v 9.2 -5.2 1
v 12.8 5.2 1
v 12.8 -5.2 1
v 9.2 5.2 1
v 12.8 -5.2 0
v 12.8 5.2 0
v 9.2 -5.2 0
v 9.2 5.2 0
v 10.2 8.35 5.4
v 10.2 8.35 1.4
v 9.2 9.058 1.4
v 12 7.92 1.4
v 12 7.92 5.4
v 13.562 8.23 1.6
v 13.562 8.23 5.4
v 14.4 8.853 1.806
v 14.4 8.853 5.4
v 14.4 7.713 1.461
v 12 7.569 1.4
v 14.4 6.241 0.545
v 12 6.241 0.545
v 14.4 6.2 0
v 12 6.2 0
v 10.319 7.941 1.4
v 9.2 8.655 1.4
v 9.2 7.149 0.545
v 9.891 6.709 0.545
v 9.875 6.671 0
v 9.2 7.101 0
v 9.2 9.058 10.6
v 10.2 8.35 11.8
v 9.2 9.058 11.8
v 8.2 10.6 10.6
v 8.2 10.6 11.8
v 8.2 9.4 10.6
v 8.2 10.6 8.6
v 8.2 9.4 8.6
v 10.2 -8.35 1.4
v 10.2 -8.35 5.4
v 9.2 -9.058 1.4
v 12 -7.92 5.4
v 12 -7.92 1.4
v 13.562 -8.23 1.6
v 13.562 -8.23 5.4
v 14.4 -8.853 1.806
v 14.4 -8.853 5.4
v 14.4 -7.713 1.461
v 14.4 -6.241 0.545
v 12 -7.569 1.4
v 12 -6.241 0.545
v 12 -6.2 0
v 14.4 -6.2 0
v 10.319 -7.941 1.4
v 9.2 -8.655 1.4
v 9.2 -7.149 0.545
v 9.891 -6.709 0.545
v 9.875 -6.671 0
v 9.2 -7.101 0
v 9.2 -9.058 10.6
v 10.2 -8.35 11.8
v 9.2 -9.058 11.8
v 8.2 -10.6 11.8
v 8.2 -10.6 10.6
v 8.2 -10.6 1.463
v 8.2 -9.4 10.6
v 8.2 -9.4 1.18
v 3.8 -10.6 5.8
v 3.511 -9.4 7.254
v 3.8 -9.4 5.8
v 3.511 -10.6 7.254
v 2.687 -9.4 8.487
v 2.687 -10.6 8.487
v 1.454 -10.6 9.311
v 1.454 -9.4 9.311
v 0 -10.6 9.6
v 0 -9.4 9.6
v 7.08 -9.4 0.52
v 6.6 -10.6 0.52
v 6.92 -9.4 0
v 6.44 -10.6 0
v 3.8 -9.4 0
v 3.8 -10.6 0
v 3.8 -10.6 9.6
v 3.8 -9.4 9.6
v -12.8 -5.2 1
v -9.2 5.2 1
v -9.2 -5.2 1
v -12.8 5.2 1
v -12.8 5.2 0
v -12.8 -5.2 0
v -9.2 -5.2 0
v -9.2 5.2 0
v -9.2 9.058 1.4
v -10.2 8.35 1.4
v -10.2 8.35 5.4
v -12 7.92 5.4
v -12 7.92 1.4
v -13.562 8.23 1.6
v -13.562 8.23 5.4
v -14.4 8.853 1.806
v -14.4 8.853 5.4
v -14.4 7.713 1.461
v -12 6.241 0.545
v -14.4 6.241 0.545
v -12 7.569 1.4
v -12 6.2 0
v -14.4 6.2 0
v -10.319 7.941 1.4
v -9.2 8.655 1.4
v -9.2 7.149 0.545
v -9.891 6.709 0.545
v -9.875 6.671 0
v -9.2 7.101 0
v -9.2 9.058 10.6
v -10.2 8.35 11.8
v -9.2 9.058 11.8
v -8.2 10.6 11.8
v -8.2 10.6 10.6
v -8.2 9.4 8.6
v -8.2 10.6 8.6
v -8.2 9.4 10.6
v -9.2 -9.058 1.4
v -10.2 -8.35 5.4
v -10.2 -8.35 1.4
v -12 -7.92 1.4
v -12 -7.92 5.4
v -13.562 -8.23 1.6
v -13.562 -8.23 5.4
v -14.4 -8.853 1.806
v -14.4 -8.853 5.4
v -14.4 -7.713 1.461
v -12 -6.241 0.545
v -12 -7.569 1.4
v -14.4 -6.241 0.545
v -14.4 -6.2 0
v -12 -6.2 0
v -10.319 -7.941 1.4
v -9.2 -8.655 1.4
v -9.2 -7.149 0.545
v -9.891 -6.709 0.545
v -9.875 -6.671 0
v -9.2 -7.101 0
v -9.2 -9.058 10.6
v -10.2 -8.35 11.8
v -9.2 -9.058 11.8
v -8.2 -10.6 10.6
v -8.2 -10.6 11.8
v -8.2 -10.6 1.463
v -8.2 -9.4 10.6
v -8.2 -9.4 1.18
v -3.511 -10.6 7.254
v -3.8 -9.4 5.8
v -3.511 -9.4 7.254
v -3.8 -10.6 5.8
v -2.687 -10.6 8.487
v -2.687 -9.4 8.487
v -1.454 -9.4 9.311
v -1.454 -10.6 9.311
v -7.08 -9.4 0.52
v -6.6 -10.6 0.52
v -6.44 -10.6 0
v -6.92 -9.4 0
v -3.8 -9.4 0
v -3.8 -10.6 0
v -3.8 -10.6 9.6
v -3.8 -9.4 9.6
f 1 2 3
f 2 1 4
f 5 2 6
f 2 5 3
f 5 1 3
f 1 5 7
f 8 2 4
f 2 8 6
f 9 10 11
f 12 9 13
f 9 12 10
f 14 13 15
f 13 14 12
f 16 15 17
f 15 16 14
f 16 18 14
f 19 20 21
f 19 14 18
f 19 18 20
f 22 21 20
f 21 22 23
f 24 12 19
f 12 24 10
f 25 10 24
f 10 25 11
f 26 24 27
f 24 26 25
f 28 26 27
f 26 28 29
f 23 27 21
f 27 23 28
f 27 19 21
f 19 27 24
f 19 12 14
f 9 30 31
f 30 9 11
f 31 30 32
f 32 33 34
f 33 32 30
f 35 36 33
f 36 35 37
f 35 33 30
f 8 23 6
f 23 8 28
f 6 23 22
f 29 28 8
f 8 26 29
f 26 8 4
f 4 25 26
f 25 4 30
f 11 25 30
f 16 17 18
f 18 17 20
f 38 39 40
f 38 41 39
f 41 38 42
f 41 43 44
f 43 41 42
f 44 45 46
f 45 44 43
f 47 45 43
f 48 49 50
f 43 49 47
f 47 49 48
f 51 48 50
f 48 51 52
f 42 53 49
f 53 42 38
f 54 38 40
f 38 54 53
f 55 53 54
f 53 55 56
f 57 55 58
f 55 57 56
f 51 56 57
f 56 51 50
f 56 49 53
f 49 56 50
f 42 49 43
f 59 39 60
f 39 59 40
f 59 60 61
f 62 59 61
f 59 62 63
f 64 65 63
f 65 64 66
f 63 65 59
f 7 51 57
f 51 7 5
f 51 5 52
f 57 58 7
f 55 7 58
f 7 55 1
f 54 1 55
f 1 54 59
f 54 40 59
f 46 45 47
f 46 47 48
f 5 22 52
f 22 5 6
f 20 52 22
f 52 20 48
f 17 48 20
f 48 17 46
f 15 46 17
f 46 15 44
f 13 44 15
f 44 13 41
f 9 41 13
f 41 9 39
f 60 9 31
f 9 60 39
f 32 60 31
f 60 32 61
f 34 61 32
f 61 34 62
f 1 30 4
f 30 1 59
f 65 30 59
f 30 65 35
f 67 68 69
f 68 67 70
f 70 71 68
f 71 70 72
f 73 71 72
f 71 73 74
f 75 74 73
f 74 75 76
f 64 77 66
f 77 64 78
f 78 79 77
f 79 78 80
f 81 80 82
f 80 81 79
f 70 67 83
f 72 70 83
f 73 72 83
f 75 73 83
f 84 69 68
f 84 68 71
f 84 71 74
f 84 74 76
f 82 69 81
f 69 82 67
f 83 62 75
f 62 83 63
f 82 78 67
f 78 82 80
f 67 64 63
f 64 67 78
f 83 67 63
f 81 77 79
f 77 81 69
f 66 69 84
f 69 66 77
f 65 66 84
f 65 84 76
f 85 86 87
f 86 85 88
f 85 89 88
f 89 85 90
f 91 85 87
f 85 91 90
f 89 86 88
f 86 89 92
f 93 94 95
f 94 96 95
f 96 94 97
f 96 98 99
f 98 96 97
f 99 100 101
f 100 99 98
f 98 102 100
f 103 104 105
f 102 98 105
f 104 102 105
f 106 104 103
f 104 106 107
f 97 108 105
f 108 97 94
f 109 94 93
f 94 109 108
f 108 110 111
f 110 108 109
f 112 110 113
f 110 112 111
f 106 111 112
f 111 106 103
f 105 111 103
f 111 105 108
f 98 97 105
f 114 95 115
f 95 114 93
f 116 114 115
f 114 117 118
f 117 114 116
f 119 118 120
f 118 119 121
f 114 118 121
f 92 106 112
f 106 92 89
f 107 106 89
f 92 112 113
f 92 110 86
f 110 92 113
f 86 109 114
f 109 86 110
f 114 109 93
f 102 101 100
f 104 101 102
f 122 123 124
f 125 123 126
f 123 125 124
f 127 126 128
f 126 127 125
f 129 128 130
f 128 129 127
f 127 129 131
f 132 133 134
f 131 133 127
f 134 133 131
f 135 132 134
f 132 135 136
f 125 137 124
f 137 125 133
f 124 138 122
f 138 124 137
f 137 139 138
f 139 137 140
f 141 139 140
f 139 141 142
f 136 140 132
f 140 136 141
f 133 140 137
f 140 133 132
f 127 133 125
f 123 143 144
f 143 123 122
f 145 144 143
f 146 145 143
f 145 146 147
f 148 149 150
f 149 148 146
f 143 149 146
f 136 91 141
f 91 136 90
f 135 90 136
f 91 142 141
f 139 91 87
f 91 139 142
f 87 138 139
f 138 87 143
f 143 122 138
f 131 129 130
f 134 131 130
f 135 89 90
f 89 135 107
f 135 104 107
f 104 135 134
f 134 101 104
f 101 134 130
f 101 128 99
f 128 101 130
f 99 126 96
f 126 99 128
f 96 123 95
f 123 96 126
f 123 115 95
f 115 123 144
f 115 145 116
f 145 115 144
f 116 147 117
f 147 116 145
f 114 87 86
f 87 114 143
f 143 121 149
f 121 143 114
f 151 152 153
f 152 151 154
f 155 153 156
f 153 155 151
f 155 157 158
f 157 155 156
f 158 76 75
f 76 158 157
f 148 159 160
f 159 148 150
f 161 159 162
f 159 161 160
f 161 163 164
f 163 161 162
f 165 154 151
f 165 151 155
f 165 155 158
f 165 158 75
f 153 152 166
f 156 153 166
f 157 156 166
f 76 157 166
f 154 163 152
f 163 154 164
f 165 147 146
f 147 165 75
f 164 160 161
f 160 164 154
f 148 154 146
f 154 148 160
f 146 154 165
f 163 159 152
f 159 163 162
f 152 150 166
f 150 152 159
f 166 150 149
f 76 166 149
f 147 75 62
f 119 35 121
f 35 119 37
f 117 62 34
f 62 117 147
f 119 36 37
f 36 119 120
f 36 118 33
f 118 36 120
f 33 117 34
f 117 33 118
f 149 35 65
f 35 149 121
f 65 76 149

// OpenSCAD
// file: ../p/1-4edge.scad
use <../lib.scad>
function ldraw_lib__1_4edge() = [
// 0 Circle 0.25
// 0 Name: 1-4edge.dat
// 0 Author: James Jessiman
// 0 !LDRAW_ORG Primitive UPDATE 2017-01
// 0 !LICENSE Licensed under CC BY 4.0 : see CAreadme.txt
// 
// 0 BFC CERTIFY CCW
  [0,"BFC","CERTIFY"],
  [0,"BFC","CCW"],
// 
// 0 !HISTORY 2007-06-22 [PTadmin] Header formatted for Contributor Agreement
// 0 !HISTORY 2008-07-01 [PTadmin] Official Update 2008-01
// 0 !HISTORY 2017-01-15 [Steffen] BFCed
// 0 !HISTORY 2017-12-30 [PTadmin] Official Update 2017-01
// 
// 
// 2 24 1 0 0 0.9239 0 0.3827
  [2,24,1,0,0,0.9239,0,0.3827],
// 2 24 0.9239 0 0.3827 0.7071 0 0.7071
  [2,24,0.9239,0,0.3827,0.7071,0,0.7071],
// 2 24 0.7071 0 0.7071 0.3827 0 0.9239
  [2,24,0.7071,0,0.7071,0.3827,0,0.9239],
// 2 24 0.3827 0 0.9239 0 0 1
  [2,24,0.3827,0,0.9239,0,0,1],
];
module ldraw_lib__1_4edge(step=0, col=false, unit=2/5, alt=false, line=0.2, solid=!$preview)
    makepoly(ldraw_lib__1_4edge(), step=step, col=col, unit=unit, alt=alt, line=line, solid=solid);
ldraw_lib__1_4edge(line=0.2);
// file: ../p/1-4cyli.scad
use <../lib.scad>
function ldraw_lib__1_4cyli() = [
// 0 Cylinder 0.25
// 0 Name: 1-4cyli.dat
// 0 Author: James Jessiman
// 0 !LDRAW_ORG Primitive UPDATE 2012-01
// 0 !LICENSE Licensed under CC BY 4.0 : see CAreadme.txt
// 
// 0 BFC CERTIFY CCW
  [0,"BFC","CERTIFY"],
  [0,"BFC","CCW"],
// 
// 0 !HISTORY 2002-03-23 [sbliss] Added BFC statement.
// 0 !HISTORY 2002-04-25 [PTadmin] Official Update 2002-02
// 0 !HISTORY 2007-06-22 [PTadmin] Header formatted for Contributor Agreement
// 0 !HISTORY 2008-07-01 [PTadmin] Official Update 2008-01
// 0 !HISTORY 2012-02-16 [Philo] Changed to CCW
// 0 !HISTORY 2012-03-30 [PTadmin] Official Update 2012-01
// 
// 
// 4 16 1 1 0 0.9239 1 0.3827 0.9239 0 0.3827 1 0 0
  [4,16,1,1,0,0.9239,1,0.3827,0.9239,0,0.3827,1,0,0],
// 5 24 1 0 0 1 1 0 0.9239 0 0.3827 1 0 -1
  [5,24,1,0,0,1,1,0,0.9239,0,0.3827,1,0,-1],
// 4 16 0.9239 1 0.3827 0.7071 1 0.7071 0.7071 0 0.7071 0.9239 0 0.3827
  [4,16,0.9239,1,0.3827,0.7071,1,0.7071,0.7071,0,0.7071,0.9239,0,0.3827],
// 5 24 0.9239 0 0.3827 0.9239 1 0.3827 0.7071 0 0.7071 1 0 0
  [5,24,0.9239,0,0.3827,0.9239,1,0.3827,0.7071,0,0.7071,1,0,0],
// 4 16 0.7071 1 0.7071 0.3827 1 0.9239 0.3827 0 0.9239 0.7071 0 0.7071
  [4,16,0.7071,1,0.7071,0.3827,1,0.9239,0.3827,0,0.9239,0.7071,0,0.7071],
// 5 24 0.7071 0 0.7071 0.7071 1 0.7071 0.3827 0 0.9239 0.9239 0 0.3827
  [5,24,0.7071,0,0.7071,0.7071,1,0.7071,0.3827,0,0.9239,0.9239,0,0.3827],
// 4 16 0.3827 1 0.9239 0 1 1 0 0 1 0.3827 0 0.9239
  [4,16,0.3827,1,0.9239,0,1,1,0,0,1,0.3827,0,0.9239],
// 5 24 0.3827 0 0.9239 0.3827 1 0.9239 0 0 1 0.7071 0 0.7071
  [5,24,0.3827,0,0.9239,0.3827,1,0.9239,0,0,1,0.7071,0,0.7071],
// 5 24 0 0 1 0 1 1 0.3827 0 0.9239 -1 0 1
  [5,24,0,0,1,0,1,1,0.3827,0,0.9239,-1,0,1],
];
module ldraw_lib__1_4cyli(step=0, col=false, unit=2/5, alt=false, line=0.2, solid=!$preview)
    makepoly(ldraw_lib__1_4cyli(), step=step, col=col, unit=unit, alt=alt, line=line, solid=solid);
ldraw_lib__1_4cyli(line=0.2);
// file: ../p/rect3.scad
use <../lib.scad>
function ldraw_lib__rect3() = [
// 0 Rectangle with 3 Edges
// 0 Name: rect3.dat
// 0 Author: Mark Kennedy [mkennedy]
// 0 !LDRAW_ORG Primitive UPDATE 2010-01
// 0 !LICENSE Licensed under CC BY 4.0 : see CAreadme.txt
// 
// 0 BFC CERTIFY CCW
  [0,"BFC","CERTIFY"],
  [0,"BFC","CCW"],
// 
// 0 !HISTORY 2003-08-01 [PTadmin] Official Update 2003-02
// 0 !HISTORY 2007-06-24 [PTadmin] Header formatted for Contributor Agreement
// 0 !HISTORY 2008-07-01 [PTadmin] Official Update 2008-01
// 0 !HISTORY 2010-01-17 [mikeheide] Change winding to CCW
// 0 !HISTORY 2010-04-05 [PTadmin] Official Update 2010-01
// 
// 
// 2 24 1 0 1 -1 0 1
  [2,24,1,0,1,-1,0,1],
// 2 24 1 0 1 1 0 -1
  [2,24,1,0,1,1,0,-1],
// 2 24 -1 0 1 -1 0 -1
  [2,24,-1,0,1,-1,0,-1],
// 4 16 -1 0 1 -1 0 -1 1 0 -1 1 0 1
  [4,16,-1,0,1,-1,0,-1,1,0,-1,1,0,1],
// 0 //
];
module ldraw_lib__rect3(step=0, col=false, unit=2/5, alt=false, line=0.2, solid=!$preview)
    makepoly(ldraw_lib__rect3(), step=step, col=col, unit=unit, alt=alt, line=line, solid=solid);
ldraw_lib__rect3(line=0.2);
// file: ../p/rect.scad
use <../lib.scad>
function ldraw_lib__rect() = [
// 0 Rectangle
// 0 Name: rect.dat
// 0 Author: James Jessiman
// 0 !LDRAW_ORG Primitive UPDATE 2010-01
// 0 !LICENSE Licensed under CC BY 2.0 and CC BY 4.0 : see CAreadme.txt
// 
// 0 BFC CERTIFY CCW
  [0,"BFC","CERTIFY"],
  [0,"BFC","CCW"],
// 
// 0 !HISTORY 2002-04-05 [hafhead] Added BFC statement
// 0 !HISTORY 2002-04-25 [PTadmin] Official Update 2002-02
// 0 !HISTORY 2007-06-24 [PTadmin] Header formatted for Contributor Agreement
// 0 !HISTORY 2008-07-01 [PTadmin] Official Update 2008-01
// 0 !HISTORY 2010-01-17 [mikeheide] changed winding to CCW
// 0 !HISTORY 2010-04-05 [PTadmin] Official Update 2010-01
// 
// 
// 2 24 1 0 1 -1 0 1
  [2,24,1,0,1,-1,0,1],
// 2 24 -1 0 1 -1 0 -1
  [2,24,-1,0,1,-1,0,-1],
// 2 24 -1 0 -1 1 0 -1
  [2,24,-1,0,-1,1,0,-1],
// 2 24 1 0 -1 1 0 1
  [2,24,1,0,-1,1,0,1],
// 4 16 -1 0 1 -1 0 -1 1 0 -1 1 0 1
  [4,16,-1,0,1,-1,0,-1,1,0,-1,1,0,1],
// 0
];
module ldraw_lib__rect(step=0, col=false, unit=2/5, alt=false, line=0.2, solid=!$preview)
    makepoly(ldraw_lib__rect(), step=step, col=col, unit=unit, alt=alt, line=line, solid=solid);
ldraw_lib__rect(line=0.2);
// file: ../p/box4-1.scad
use <../lib.scad>
function ldraw_lib__box4_1() = [
// 0 Box with 4 Faces without 1 Edge
// 0 Name: box4-1.dat
// 0 Author: Tore Eriksson [Tore_Eriksson]
// 0 !LDRAW_ORG Primitive UPDATE 2012-01
// 0 !LICENSE Licensed under CC BY 2.0 and CC BY 4.0 : see CAreadme.txt
// 
// 0 BFC CERTIFY CCW
  [0,"BFC","CERTIFY"],
  [0,"BFC","CCW"],
// 
// 0 !HISTORY 1998-07-15 [PTadmin] Official Update 1998-07
// 0 !HISTORY 2002-04-05 [hafhead] Made BFC compliant
// 0 !HISTORY 2002-04-25 [PTadmin] Official Update 2002-02
// 0 !HISTORY 2007-06-24 [PTadmin] Header formatted for Contributor Agreement
// 0 !HISTORY 2008-07-01 [PTadmin] Official Update 2008-01
// 0 !HISTORY 2012-02-16 [Philo] Changed to CCW
// 0 !HISTORY 2012-03-30 [PTadmin] Official Update 2012-01
// 
// 
// 2 24 1 1 1 -1 1 1
  [2,24,1,1,1,-1,1,1],
// 2 24 -1 1 1 -1 1 -1
  [2,24,-1,1,1,-1,1,-1],
// 2 24 -1 1 -1 1 1 -1
  [2,24,-1,1,-1,1,1,-1],
// 2 24 1 1 -1 1 1 1
  [2,24,1,1,-1,1,1,1],
// 2 24 1 0 1 -1 0 1
  [2,24,1,0,1,-1,0,1],
// 2 24 -1 0 1 -1 0 -1
  [2,24,-1,0,1,-1,0,-1],
// 2 24 1 0 -1 1 0 1
  [2,24,1,0,-1,1,0,1],
// 2 24 1 0 1 1 1 1
  [2,24,1,0,1,1,1,1],
// 2 24 -1 0 1 -1 1 1
  [2,24,-1,0,1,-1,1,1],
// 2 24 1 0 -1 1 1 -1
  [2,24,1,0,-1,1,1,-1],
// 2 24 -1 0 -1 -1 1 -1
  [2,24,-1,0,-1,-1,1,-1],
// 4 16 -1 1 1 1 1 1 1 1 -1 -1 1 -1
  [4,16,-1,1,1,1,1,1,1,1,-1,-1,1,-1],
// 4 16 -1 1 1 -1 0 1 1 0 1 1 1 1
  [4,16,-1,1,1,-1,0,1,1,0,1,1,1,1],
// 4 16 -1 1 -1 -1 0 -1 -1 0 1 -1 1 1
  [4,16,-1,1,-1,-1,0,-1,-1,0,1,-1,1,1],
// 4 16 1 1 1 1 0 1 1 0 -1 1 1 -1
  [4,16,1,1,1,1,0,1,1,0,-1,1,1,-1],
];
module ldraw_lib__box4_1(step=0, col=false, unit=2/5, alt=false, line=0.2, solid=!$preview)
    makepoly(ldraw_lib__box4_1(), step=step, col=col, unit=unit, alt=alt, line=line, solid=solid);
ldraw_lib__box4_1(line=0.2);
// file: ../p/1-4ndis.scad
use <../lib.scad>
function ldraw_lib__1_4ndis() = [
// 0 Disc Negative 0.25
// 0 Name: 1-4ndis.dat
// 0 Author: James Jessiman
// 0 !LDRAW_ORG Primitive UPDATE 2012-01
// 0 !LICENSE Licensed under CC BY 4.0 : see CAreadme.txt
// 
// 0 BFC CERTIFY CCW
  [0,"BFC","CERTIFY"],
  [0,"BFC","CCW"],
// 
// 0 !HISTORY 2002-03-23 [sbliss] Added BFC Statement
// 0 !HISTORY 2002-04-25 [PTadmin] Official Update 2002-02
// 0 !HISTORY 2007-06-22 [PTadmin] Header formatted for Contributor Agreement
// 0 !HISTORY 2008-07-01 [PTadmin] Official Update 2008-01
// 0 !HISTORY 2012-02-16 [Philo] Changed to CCW
// 0 !HISTORY 2012-03-30 [PTadmin] Official Update 2012-01
// 
// 
// 3 16 0.9239 0 0.3827 1 0 0 1 0 1
  [3,16,0.9239,0,0.3827,1,0,0,1,0,1],
// 3 16 0.7071 0 0.7071 0.9239 0 0.3827 1 0 1
  [3,16,0.7071,0,0.7071,0.9239,0,0.3827,1,0,1],
// 3 16 0.3827 0 0.9239 0.7071 0 0.7071 1 0 1
  [3,16,0.3827,0,0.9239,0.7071,0,0.7071,1,0,1],
// 3 16 0 0 1 0.3827 0 0.9239 1 0 1
  [3,16,0,0,1,0.3827,0,0.9239,1,0,1],
];
module ldraw_lib__1_4ndis(step=0, col=false, unit=2/5, alt=false, line=0.2, solid=!$preview)
    makepoly(ldraw_lib__1_4ndis(), step=step, col=col, unit=unit, alt=alt, line=line, solid=solid);
ldraw_lib__1_4ndis(line=0.2);
// file: ../p/1-4cylo.scad
use <../lib.scad>
use <1-4cyli.scad>
use <1-4edge.scad>
function ldraw_lib__1_4cylo() = [
// 0 Cylinder Open 0.25
// 0 Name: 1-4cylo.dat
// 0 Author: Max Martin Richter [MMR1988]
// 0 !LDRAW_ORG Primitive UPDATE 2010-03
// 0 !LICENSE Licensed under CC BY 4.0 : see CAreadme.txt
// 
// 0 BFC CERTIFY CCW
  [0,"BFC","CERTIFY"],
  [0,"BFC","CCW"],
// 
// 0 !HISTORY 2010-12-31 [PTadmin] Official Update 2010-03
// 
// 
// 1 16 0 0 0 1 0 0 0 1 0 0 0 1 1-4edge.dat
  [1,16,0,0,0,1,0,0,0,1,0,0,0,1, ldraw_lib__1_4edge()],
// 1 16 0 1 0 1 0 0 0 1 0 0 0 1 1-4edge.dat
  [1,16,0,1,0,1,0,0,0,1,0,0,0,1, ldraw_lib__1_4edge()],
// 1 16 0 0 0 1 0 0 0 1 0 0 0 1 1-4cyli.dat
  [1,16,0,0,0,1,0,0,0,1,0,0,0,1, ldraw_lib__1_4cyli()],
];
module ldraw_lib__1_4cylo(step=0, col=false, unit=2/5, alt=false, line=0.2, solid=!$preview)
    makepoly(ldraw_lib__1_4cylo(), step=step, col=col, unit=unit, alt=alt, line=line, solid=solid);
ldraw_lib__1_4cylo(line=0.2);
// file: ../p/rect2p.scad
use <../lib.scad>
function ldraw_lib__rect2p() = [
// 0 Rectangle with 2 Parallel Edges
// 0 Name: rect2p.dat
// 0 Author: Donald Sutter [technog]
// 0 !LDRAW_ORG Primitive UPDATE 2010-01
// 0 !LICENSE Licensed under CC BY 4.0 : see CAreadme.txt
// 
// 0 BFC CERTIFY CCW
  [0,"BFC","CERTIFY"],
  [0,"BFC","CCW"],
// 
// 0 !HISTORY 2003-08-01 [PTadmin] Official Update 2003-02
// 0 !HISTORY 2007-06-24 [PTadmin] Header formatted for Contributor Agreement
// 0 !HISTORY 2008-07-01 [PTadmin] Official Update 2008-01
// 0 !HISTORY 2010-01-17 [mikeheide] changed winding to CCW
// 0 !HISTORY 2010-04-05 [PTadmin] Official Update 2010-01
// 
// 
// 2 24 1 0 1 -1 0 1
  [2,24,1,0,1,-1,0,1],
// 2 24 -1 0 -1 1 0 -1
  [2,24,-1,0,-1,1,0,-1],
// 4 16 -1 0 1 -1 0 -1 1 0 -1 1 0 1
  [4,16,-1,0,1,-1,0,-1,1,0,-1,1,0,1],
// 0
];
module ldraw_lib__rect2p(step=0, col=false, unit=2/5, alt=false, line=0.2, solid=!$preview)
    makepoly(ldraw_lib__rect2p(), step=step, col=col, unit=unit, alt=alt, line=line, solid=solid);
ldraw_lib__rect2p(line=0.2);
// file: ../p/rect1.scad
use <../lib.scad>
function ldraw_lib__rect1() = [
// 0 Rectangle with 1 Edge
// 0 Name: rect1.dat
// 0 Author: Chris Dee [cwdee]
// 0 !LDRAW_ORG Primitive UPDATE 2010-01
// 0 !LICENSE Licensed under CC BY 4.0 : see CAreadme.txt
// 
// 0 BFC CERTIFY CCW
  [0,"BFC","CERTIFY"],
  [0,"BFC","CCW"],
// 
// 0 !HISTORY 2003-12-19 [PTadmin] Official Update 2003-03
// 0 !HISTORY 2007-06-24 [PTadmin] Header formatted for Contributor Agreement
// 0 !HISTORY 2008-07-01 [PTadmin] Official Update 2008-01
// 0 !HISTORY 2010-01-17 [mikeheide] changed winding to CCW
// 0 !HISTORY 2010-04-05 [PTadmin] Official Update 2010-01
// 
// 
// 2 24 1 0 -1 1 0 1
  [2,24,1,0,-1,1,0,1],
// 4 16 -1 0 1 -1 0 -1 1 0 -1 1 0 1
  [4,16,-1,0,1,-1,0,-1,1,0,-1,1,0,1],
// 0
];
module ldraw_lib__rect1(step=0, col=false, unit=2/5, alt=false, line=0.2, solid=!$preview)
    makepoly(ldraw_lib__rect1(), step=step, col=col, unit=unit, alt=alt, line=line, solid=solid);
ldraw_lib__rect1(line=0.2);
// main file
use <../lib.scad>
use <../p/rect1.scad>
use <../p/rect2p.scad>
use <s/t1102s01.scad>
function ldraw_lib__t1102() = [
// 0 ~| Circuit Cubes High Speed Motor Cover
// 0 Name: t1102.dat
// 0 Author: Philippe Hurbain [Philo]
// 0 !LDRAW_ORG Part UPDATE 2022-05
// 0 !LICENSE Licensed under CC BY 4.0 : see CAreadme.txt
// 
// 0 BFC CERTIFY CCW
  [0,"BFC","CERTIFY"],
  [0,"BFC","CCW"],
// 
// 0 !CATEGORY Electric
// 
// 0 !HISTORY 2022-09-15 [PTadmin] Official Update 2022-05
// 
// 
// 1 16 0 0 0 1 0 0 0 1 0 0 0 1 s\t1102s01.dat
  [1,16,0,0,0,1,0,0,0,1,0,0,0,1, ldraw_lib__s__t1102s01()],
// 1 16 0 0 0 -1 0 0 0 1 0 0 0 1 s\t1102s01.dat
  [1,16,0,0,0,-1,0,0,0,1,0,0,0,1, ldraw_lib__s__t1102s01()],
// 3 16 -20.5 -29.5 -26.5 0 -24 -26.5 20.5 -29.5 -26.5
  [3,16,-20.5,-29.5,-26.5,0,-24,-26.5,20.5,-29.5,-26.5],
// 1 16 0 -24 23.5 -20.5 0 0 0 0 2.5 0 1 0 rect2p.dat
  [1,16,0,-24,23.5,-20.5,0,0,0,0,2.5,0,1,0, ldraw_lib__rect2p()],
// 1 16 0 -29.5 0 -20.5 0 0 0 1 0 0 0 -26.5 rect2p.dat
  [1,16,0,-29.5,0,-20.5,0,0,0,1,0,0,0,-26.5, ldraw_lib__rect2p()],
// 1 16 0 -21.5 25 0 0 20.5 0 -1 0 1.5 0 0 rect1.dat
  [1,16,0,-21.5,25,0,0,20.5,0,-1,0,1.5,0,0, ldraw_lib__rect1()],
// 4 16 20.5 -21.5 26.5 -20.5 -21.5 26.5 -20.5 -26.5 26.5 20.5 -26.5 26.5
  [4,16,20.5,-21.5,26.5,-20.5,-21.5,26.5,-20.5,-26.5,26.5,20.5,-26.5,26.5],
// 4 16 20.5 -29.5 26.5 20.5 -26.5 26.5 -20.5 -26.5 26.5 -20.5 -29.5 26.5
  [4,16,20.5,-29.5,26.5,20.5,-26.5,26.5,-20.5,-26.5,26.5,-20.5,-29.5,26.5],
// 1 16 0 -26.5 0 0 0 -20.5 0 -1 0 -23.5 0 0 rect1.dat
  [1,16,0,-26.5,0,0,0,-20.5,0,-1,0,-23.5,0,0, ldraw_lib__rect1()],
// 3 16 20.5 -26.5 -23.5 0 -24 -23.5 -20.5 -26.5 -23.5
  [3,16,20.5,-26.5,-23.5,0,-24,-23.5,-20.5,-26.5,-23.5],
];
module ldraw_lib__t1102(step=0, col=false, unit=2/5, alt=false, line=0.2, solid=!$preview)
    makepoly(ldraw_lib__t1102(), step=step, col=col, unit=unit, alt=alt, line=line, solid=solid);
ldraw_lib__t1102(line=0.2);
